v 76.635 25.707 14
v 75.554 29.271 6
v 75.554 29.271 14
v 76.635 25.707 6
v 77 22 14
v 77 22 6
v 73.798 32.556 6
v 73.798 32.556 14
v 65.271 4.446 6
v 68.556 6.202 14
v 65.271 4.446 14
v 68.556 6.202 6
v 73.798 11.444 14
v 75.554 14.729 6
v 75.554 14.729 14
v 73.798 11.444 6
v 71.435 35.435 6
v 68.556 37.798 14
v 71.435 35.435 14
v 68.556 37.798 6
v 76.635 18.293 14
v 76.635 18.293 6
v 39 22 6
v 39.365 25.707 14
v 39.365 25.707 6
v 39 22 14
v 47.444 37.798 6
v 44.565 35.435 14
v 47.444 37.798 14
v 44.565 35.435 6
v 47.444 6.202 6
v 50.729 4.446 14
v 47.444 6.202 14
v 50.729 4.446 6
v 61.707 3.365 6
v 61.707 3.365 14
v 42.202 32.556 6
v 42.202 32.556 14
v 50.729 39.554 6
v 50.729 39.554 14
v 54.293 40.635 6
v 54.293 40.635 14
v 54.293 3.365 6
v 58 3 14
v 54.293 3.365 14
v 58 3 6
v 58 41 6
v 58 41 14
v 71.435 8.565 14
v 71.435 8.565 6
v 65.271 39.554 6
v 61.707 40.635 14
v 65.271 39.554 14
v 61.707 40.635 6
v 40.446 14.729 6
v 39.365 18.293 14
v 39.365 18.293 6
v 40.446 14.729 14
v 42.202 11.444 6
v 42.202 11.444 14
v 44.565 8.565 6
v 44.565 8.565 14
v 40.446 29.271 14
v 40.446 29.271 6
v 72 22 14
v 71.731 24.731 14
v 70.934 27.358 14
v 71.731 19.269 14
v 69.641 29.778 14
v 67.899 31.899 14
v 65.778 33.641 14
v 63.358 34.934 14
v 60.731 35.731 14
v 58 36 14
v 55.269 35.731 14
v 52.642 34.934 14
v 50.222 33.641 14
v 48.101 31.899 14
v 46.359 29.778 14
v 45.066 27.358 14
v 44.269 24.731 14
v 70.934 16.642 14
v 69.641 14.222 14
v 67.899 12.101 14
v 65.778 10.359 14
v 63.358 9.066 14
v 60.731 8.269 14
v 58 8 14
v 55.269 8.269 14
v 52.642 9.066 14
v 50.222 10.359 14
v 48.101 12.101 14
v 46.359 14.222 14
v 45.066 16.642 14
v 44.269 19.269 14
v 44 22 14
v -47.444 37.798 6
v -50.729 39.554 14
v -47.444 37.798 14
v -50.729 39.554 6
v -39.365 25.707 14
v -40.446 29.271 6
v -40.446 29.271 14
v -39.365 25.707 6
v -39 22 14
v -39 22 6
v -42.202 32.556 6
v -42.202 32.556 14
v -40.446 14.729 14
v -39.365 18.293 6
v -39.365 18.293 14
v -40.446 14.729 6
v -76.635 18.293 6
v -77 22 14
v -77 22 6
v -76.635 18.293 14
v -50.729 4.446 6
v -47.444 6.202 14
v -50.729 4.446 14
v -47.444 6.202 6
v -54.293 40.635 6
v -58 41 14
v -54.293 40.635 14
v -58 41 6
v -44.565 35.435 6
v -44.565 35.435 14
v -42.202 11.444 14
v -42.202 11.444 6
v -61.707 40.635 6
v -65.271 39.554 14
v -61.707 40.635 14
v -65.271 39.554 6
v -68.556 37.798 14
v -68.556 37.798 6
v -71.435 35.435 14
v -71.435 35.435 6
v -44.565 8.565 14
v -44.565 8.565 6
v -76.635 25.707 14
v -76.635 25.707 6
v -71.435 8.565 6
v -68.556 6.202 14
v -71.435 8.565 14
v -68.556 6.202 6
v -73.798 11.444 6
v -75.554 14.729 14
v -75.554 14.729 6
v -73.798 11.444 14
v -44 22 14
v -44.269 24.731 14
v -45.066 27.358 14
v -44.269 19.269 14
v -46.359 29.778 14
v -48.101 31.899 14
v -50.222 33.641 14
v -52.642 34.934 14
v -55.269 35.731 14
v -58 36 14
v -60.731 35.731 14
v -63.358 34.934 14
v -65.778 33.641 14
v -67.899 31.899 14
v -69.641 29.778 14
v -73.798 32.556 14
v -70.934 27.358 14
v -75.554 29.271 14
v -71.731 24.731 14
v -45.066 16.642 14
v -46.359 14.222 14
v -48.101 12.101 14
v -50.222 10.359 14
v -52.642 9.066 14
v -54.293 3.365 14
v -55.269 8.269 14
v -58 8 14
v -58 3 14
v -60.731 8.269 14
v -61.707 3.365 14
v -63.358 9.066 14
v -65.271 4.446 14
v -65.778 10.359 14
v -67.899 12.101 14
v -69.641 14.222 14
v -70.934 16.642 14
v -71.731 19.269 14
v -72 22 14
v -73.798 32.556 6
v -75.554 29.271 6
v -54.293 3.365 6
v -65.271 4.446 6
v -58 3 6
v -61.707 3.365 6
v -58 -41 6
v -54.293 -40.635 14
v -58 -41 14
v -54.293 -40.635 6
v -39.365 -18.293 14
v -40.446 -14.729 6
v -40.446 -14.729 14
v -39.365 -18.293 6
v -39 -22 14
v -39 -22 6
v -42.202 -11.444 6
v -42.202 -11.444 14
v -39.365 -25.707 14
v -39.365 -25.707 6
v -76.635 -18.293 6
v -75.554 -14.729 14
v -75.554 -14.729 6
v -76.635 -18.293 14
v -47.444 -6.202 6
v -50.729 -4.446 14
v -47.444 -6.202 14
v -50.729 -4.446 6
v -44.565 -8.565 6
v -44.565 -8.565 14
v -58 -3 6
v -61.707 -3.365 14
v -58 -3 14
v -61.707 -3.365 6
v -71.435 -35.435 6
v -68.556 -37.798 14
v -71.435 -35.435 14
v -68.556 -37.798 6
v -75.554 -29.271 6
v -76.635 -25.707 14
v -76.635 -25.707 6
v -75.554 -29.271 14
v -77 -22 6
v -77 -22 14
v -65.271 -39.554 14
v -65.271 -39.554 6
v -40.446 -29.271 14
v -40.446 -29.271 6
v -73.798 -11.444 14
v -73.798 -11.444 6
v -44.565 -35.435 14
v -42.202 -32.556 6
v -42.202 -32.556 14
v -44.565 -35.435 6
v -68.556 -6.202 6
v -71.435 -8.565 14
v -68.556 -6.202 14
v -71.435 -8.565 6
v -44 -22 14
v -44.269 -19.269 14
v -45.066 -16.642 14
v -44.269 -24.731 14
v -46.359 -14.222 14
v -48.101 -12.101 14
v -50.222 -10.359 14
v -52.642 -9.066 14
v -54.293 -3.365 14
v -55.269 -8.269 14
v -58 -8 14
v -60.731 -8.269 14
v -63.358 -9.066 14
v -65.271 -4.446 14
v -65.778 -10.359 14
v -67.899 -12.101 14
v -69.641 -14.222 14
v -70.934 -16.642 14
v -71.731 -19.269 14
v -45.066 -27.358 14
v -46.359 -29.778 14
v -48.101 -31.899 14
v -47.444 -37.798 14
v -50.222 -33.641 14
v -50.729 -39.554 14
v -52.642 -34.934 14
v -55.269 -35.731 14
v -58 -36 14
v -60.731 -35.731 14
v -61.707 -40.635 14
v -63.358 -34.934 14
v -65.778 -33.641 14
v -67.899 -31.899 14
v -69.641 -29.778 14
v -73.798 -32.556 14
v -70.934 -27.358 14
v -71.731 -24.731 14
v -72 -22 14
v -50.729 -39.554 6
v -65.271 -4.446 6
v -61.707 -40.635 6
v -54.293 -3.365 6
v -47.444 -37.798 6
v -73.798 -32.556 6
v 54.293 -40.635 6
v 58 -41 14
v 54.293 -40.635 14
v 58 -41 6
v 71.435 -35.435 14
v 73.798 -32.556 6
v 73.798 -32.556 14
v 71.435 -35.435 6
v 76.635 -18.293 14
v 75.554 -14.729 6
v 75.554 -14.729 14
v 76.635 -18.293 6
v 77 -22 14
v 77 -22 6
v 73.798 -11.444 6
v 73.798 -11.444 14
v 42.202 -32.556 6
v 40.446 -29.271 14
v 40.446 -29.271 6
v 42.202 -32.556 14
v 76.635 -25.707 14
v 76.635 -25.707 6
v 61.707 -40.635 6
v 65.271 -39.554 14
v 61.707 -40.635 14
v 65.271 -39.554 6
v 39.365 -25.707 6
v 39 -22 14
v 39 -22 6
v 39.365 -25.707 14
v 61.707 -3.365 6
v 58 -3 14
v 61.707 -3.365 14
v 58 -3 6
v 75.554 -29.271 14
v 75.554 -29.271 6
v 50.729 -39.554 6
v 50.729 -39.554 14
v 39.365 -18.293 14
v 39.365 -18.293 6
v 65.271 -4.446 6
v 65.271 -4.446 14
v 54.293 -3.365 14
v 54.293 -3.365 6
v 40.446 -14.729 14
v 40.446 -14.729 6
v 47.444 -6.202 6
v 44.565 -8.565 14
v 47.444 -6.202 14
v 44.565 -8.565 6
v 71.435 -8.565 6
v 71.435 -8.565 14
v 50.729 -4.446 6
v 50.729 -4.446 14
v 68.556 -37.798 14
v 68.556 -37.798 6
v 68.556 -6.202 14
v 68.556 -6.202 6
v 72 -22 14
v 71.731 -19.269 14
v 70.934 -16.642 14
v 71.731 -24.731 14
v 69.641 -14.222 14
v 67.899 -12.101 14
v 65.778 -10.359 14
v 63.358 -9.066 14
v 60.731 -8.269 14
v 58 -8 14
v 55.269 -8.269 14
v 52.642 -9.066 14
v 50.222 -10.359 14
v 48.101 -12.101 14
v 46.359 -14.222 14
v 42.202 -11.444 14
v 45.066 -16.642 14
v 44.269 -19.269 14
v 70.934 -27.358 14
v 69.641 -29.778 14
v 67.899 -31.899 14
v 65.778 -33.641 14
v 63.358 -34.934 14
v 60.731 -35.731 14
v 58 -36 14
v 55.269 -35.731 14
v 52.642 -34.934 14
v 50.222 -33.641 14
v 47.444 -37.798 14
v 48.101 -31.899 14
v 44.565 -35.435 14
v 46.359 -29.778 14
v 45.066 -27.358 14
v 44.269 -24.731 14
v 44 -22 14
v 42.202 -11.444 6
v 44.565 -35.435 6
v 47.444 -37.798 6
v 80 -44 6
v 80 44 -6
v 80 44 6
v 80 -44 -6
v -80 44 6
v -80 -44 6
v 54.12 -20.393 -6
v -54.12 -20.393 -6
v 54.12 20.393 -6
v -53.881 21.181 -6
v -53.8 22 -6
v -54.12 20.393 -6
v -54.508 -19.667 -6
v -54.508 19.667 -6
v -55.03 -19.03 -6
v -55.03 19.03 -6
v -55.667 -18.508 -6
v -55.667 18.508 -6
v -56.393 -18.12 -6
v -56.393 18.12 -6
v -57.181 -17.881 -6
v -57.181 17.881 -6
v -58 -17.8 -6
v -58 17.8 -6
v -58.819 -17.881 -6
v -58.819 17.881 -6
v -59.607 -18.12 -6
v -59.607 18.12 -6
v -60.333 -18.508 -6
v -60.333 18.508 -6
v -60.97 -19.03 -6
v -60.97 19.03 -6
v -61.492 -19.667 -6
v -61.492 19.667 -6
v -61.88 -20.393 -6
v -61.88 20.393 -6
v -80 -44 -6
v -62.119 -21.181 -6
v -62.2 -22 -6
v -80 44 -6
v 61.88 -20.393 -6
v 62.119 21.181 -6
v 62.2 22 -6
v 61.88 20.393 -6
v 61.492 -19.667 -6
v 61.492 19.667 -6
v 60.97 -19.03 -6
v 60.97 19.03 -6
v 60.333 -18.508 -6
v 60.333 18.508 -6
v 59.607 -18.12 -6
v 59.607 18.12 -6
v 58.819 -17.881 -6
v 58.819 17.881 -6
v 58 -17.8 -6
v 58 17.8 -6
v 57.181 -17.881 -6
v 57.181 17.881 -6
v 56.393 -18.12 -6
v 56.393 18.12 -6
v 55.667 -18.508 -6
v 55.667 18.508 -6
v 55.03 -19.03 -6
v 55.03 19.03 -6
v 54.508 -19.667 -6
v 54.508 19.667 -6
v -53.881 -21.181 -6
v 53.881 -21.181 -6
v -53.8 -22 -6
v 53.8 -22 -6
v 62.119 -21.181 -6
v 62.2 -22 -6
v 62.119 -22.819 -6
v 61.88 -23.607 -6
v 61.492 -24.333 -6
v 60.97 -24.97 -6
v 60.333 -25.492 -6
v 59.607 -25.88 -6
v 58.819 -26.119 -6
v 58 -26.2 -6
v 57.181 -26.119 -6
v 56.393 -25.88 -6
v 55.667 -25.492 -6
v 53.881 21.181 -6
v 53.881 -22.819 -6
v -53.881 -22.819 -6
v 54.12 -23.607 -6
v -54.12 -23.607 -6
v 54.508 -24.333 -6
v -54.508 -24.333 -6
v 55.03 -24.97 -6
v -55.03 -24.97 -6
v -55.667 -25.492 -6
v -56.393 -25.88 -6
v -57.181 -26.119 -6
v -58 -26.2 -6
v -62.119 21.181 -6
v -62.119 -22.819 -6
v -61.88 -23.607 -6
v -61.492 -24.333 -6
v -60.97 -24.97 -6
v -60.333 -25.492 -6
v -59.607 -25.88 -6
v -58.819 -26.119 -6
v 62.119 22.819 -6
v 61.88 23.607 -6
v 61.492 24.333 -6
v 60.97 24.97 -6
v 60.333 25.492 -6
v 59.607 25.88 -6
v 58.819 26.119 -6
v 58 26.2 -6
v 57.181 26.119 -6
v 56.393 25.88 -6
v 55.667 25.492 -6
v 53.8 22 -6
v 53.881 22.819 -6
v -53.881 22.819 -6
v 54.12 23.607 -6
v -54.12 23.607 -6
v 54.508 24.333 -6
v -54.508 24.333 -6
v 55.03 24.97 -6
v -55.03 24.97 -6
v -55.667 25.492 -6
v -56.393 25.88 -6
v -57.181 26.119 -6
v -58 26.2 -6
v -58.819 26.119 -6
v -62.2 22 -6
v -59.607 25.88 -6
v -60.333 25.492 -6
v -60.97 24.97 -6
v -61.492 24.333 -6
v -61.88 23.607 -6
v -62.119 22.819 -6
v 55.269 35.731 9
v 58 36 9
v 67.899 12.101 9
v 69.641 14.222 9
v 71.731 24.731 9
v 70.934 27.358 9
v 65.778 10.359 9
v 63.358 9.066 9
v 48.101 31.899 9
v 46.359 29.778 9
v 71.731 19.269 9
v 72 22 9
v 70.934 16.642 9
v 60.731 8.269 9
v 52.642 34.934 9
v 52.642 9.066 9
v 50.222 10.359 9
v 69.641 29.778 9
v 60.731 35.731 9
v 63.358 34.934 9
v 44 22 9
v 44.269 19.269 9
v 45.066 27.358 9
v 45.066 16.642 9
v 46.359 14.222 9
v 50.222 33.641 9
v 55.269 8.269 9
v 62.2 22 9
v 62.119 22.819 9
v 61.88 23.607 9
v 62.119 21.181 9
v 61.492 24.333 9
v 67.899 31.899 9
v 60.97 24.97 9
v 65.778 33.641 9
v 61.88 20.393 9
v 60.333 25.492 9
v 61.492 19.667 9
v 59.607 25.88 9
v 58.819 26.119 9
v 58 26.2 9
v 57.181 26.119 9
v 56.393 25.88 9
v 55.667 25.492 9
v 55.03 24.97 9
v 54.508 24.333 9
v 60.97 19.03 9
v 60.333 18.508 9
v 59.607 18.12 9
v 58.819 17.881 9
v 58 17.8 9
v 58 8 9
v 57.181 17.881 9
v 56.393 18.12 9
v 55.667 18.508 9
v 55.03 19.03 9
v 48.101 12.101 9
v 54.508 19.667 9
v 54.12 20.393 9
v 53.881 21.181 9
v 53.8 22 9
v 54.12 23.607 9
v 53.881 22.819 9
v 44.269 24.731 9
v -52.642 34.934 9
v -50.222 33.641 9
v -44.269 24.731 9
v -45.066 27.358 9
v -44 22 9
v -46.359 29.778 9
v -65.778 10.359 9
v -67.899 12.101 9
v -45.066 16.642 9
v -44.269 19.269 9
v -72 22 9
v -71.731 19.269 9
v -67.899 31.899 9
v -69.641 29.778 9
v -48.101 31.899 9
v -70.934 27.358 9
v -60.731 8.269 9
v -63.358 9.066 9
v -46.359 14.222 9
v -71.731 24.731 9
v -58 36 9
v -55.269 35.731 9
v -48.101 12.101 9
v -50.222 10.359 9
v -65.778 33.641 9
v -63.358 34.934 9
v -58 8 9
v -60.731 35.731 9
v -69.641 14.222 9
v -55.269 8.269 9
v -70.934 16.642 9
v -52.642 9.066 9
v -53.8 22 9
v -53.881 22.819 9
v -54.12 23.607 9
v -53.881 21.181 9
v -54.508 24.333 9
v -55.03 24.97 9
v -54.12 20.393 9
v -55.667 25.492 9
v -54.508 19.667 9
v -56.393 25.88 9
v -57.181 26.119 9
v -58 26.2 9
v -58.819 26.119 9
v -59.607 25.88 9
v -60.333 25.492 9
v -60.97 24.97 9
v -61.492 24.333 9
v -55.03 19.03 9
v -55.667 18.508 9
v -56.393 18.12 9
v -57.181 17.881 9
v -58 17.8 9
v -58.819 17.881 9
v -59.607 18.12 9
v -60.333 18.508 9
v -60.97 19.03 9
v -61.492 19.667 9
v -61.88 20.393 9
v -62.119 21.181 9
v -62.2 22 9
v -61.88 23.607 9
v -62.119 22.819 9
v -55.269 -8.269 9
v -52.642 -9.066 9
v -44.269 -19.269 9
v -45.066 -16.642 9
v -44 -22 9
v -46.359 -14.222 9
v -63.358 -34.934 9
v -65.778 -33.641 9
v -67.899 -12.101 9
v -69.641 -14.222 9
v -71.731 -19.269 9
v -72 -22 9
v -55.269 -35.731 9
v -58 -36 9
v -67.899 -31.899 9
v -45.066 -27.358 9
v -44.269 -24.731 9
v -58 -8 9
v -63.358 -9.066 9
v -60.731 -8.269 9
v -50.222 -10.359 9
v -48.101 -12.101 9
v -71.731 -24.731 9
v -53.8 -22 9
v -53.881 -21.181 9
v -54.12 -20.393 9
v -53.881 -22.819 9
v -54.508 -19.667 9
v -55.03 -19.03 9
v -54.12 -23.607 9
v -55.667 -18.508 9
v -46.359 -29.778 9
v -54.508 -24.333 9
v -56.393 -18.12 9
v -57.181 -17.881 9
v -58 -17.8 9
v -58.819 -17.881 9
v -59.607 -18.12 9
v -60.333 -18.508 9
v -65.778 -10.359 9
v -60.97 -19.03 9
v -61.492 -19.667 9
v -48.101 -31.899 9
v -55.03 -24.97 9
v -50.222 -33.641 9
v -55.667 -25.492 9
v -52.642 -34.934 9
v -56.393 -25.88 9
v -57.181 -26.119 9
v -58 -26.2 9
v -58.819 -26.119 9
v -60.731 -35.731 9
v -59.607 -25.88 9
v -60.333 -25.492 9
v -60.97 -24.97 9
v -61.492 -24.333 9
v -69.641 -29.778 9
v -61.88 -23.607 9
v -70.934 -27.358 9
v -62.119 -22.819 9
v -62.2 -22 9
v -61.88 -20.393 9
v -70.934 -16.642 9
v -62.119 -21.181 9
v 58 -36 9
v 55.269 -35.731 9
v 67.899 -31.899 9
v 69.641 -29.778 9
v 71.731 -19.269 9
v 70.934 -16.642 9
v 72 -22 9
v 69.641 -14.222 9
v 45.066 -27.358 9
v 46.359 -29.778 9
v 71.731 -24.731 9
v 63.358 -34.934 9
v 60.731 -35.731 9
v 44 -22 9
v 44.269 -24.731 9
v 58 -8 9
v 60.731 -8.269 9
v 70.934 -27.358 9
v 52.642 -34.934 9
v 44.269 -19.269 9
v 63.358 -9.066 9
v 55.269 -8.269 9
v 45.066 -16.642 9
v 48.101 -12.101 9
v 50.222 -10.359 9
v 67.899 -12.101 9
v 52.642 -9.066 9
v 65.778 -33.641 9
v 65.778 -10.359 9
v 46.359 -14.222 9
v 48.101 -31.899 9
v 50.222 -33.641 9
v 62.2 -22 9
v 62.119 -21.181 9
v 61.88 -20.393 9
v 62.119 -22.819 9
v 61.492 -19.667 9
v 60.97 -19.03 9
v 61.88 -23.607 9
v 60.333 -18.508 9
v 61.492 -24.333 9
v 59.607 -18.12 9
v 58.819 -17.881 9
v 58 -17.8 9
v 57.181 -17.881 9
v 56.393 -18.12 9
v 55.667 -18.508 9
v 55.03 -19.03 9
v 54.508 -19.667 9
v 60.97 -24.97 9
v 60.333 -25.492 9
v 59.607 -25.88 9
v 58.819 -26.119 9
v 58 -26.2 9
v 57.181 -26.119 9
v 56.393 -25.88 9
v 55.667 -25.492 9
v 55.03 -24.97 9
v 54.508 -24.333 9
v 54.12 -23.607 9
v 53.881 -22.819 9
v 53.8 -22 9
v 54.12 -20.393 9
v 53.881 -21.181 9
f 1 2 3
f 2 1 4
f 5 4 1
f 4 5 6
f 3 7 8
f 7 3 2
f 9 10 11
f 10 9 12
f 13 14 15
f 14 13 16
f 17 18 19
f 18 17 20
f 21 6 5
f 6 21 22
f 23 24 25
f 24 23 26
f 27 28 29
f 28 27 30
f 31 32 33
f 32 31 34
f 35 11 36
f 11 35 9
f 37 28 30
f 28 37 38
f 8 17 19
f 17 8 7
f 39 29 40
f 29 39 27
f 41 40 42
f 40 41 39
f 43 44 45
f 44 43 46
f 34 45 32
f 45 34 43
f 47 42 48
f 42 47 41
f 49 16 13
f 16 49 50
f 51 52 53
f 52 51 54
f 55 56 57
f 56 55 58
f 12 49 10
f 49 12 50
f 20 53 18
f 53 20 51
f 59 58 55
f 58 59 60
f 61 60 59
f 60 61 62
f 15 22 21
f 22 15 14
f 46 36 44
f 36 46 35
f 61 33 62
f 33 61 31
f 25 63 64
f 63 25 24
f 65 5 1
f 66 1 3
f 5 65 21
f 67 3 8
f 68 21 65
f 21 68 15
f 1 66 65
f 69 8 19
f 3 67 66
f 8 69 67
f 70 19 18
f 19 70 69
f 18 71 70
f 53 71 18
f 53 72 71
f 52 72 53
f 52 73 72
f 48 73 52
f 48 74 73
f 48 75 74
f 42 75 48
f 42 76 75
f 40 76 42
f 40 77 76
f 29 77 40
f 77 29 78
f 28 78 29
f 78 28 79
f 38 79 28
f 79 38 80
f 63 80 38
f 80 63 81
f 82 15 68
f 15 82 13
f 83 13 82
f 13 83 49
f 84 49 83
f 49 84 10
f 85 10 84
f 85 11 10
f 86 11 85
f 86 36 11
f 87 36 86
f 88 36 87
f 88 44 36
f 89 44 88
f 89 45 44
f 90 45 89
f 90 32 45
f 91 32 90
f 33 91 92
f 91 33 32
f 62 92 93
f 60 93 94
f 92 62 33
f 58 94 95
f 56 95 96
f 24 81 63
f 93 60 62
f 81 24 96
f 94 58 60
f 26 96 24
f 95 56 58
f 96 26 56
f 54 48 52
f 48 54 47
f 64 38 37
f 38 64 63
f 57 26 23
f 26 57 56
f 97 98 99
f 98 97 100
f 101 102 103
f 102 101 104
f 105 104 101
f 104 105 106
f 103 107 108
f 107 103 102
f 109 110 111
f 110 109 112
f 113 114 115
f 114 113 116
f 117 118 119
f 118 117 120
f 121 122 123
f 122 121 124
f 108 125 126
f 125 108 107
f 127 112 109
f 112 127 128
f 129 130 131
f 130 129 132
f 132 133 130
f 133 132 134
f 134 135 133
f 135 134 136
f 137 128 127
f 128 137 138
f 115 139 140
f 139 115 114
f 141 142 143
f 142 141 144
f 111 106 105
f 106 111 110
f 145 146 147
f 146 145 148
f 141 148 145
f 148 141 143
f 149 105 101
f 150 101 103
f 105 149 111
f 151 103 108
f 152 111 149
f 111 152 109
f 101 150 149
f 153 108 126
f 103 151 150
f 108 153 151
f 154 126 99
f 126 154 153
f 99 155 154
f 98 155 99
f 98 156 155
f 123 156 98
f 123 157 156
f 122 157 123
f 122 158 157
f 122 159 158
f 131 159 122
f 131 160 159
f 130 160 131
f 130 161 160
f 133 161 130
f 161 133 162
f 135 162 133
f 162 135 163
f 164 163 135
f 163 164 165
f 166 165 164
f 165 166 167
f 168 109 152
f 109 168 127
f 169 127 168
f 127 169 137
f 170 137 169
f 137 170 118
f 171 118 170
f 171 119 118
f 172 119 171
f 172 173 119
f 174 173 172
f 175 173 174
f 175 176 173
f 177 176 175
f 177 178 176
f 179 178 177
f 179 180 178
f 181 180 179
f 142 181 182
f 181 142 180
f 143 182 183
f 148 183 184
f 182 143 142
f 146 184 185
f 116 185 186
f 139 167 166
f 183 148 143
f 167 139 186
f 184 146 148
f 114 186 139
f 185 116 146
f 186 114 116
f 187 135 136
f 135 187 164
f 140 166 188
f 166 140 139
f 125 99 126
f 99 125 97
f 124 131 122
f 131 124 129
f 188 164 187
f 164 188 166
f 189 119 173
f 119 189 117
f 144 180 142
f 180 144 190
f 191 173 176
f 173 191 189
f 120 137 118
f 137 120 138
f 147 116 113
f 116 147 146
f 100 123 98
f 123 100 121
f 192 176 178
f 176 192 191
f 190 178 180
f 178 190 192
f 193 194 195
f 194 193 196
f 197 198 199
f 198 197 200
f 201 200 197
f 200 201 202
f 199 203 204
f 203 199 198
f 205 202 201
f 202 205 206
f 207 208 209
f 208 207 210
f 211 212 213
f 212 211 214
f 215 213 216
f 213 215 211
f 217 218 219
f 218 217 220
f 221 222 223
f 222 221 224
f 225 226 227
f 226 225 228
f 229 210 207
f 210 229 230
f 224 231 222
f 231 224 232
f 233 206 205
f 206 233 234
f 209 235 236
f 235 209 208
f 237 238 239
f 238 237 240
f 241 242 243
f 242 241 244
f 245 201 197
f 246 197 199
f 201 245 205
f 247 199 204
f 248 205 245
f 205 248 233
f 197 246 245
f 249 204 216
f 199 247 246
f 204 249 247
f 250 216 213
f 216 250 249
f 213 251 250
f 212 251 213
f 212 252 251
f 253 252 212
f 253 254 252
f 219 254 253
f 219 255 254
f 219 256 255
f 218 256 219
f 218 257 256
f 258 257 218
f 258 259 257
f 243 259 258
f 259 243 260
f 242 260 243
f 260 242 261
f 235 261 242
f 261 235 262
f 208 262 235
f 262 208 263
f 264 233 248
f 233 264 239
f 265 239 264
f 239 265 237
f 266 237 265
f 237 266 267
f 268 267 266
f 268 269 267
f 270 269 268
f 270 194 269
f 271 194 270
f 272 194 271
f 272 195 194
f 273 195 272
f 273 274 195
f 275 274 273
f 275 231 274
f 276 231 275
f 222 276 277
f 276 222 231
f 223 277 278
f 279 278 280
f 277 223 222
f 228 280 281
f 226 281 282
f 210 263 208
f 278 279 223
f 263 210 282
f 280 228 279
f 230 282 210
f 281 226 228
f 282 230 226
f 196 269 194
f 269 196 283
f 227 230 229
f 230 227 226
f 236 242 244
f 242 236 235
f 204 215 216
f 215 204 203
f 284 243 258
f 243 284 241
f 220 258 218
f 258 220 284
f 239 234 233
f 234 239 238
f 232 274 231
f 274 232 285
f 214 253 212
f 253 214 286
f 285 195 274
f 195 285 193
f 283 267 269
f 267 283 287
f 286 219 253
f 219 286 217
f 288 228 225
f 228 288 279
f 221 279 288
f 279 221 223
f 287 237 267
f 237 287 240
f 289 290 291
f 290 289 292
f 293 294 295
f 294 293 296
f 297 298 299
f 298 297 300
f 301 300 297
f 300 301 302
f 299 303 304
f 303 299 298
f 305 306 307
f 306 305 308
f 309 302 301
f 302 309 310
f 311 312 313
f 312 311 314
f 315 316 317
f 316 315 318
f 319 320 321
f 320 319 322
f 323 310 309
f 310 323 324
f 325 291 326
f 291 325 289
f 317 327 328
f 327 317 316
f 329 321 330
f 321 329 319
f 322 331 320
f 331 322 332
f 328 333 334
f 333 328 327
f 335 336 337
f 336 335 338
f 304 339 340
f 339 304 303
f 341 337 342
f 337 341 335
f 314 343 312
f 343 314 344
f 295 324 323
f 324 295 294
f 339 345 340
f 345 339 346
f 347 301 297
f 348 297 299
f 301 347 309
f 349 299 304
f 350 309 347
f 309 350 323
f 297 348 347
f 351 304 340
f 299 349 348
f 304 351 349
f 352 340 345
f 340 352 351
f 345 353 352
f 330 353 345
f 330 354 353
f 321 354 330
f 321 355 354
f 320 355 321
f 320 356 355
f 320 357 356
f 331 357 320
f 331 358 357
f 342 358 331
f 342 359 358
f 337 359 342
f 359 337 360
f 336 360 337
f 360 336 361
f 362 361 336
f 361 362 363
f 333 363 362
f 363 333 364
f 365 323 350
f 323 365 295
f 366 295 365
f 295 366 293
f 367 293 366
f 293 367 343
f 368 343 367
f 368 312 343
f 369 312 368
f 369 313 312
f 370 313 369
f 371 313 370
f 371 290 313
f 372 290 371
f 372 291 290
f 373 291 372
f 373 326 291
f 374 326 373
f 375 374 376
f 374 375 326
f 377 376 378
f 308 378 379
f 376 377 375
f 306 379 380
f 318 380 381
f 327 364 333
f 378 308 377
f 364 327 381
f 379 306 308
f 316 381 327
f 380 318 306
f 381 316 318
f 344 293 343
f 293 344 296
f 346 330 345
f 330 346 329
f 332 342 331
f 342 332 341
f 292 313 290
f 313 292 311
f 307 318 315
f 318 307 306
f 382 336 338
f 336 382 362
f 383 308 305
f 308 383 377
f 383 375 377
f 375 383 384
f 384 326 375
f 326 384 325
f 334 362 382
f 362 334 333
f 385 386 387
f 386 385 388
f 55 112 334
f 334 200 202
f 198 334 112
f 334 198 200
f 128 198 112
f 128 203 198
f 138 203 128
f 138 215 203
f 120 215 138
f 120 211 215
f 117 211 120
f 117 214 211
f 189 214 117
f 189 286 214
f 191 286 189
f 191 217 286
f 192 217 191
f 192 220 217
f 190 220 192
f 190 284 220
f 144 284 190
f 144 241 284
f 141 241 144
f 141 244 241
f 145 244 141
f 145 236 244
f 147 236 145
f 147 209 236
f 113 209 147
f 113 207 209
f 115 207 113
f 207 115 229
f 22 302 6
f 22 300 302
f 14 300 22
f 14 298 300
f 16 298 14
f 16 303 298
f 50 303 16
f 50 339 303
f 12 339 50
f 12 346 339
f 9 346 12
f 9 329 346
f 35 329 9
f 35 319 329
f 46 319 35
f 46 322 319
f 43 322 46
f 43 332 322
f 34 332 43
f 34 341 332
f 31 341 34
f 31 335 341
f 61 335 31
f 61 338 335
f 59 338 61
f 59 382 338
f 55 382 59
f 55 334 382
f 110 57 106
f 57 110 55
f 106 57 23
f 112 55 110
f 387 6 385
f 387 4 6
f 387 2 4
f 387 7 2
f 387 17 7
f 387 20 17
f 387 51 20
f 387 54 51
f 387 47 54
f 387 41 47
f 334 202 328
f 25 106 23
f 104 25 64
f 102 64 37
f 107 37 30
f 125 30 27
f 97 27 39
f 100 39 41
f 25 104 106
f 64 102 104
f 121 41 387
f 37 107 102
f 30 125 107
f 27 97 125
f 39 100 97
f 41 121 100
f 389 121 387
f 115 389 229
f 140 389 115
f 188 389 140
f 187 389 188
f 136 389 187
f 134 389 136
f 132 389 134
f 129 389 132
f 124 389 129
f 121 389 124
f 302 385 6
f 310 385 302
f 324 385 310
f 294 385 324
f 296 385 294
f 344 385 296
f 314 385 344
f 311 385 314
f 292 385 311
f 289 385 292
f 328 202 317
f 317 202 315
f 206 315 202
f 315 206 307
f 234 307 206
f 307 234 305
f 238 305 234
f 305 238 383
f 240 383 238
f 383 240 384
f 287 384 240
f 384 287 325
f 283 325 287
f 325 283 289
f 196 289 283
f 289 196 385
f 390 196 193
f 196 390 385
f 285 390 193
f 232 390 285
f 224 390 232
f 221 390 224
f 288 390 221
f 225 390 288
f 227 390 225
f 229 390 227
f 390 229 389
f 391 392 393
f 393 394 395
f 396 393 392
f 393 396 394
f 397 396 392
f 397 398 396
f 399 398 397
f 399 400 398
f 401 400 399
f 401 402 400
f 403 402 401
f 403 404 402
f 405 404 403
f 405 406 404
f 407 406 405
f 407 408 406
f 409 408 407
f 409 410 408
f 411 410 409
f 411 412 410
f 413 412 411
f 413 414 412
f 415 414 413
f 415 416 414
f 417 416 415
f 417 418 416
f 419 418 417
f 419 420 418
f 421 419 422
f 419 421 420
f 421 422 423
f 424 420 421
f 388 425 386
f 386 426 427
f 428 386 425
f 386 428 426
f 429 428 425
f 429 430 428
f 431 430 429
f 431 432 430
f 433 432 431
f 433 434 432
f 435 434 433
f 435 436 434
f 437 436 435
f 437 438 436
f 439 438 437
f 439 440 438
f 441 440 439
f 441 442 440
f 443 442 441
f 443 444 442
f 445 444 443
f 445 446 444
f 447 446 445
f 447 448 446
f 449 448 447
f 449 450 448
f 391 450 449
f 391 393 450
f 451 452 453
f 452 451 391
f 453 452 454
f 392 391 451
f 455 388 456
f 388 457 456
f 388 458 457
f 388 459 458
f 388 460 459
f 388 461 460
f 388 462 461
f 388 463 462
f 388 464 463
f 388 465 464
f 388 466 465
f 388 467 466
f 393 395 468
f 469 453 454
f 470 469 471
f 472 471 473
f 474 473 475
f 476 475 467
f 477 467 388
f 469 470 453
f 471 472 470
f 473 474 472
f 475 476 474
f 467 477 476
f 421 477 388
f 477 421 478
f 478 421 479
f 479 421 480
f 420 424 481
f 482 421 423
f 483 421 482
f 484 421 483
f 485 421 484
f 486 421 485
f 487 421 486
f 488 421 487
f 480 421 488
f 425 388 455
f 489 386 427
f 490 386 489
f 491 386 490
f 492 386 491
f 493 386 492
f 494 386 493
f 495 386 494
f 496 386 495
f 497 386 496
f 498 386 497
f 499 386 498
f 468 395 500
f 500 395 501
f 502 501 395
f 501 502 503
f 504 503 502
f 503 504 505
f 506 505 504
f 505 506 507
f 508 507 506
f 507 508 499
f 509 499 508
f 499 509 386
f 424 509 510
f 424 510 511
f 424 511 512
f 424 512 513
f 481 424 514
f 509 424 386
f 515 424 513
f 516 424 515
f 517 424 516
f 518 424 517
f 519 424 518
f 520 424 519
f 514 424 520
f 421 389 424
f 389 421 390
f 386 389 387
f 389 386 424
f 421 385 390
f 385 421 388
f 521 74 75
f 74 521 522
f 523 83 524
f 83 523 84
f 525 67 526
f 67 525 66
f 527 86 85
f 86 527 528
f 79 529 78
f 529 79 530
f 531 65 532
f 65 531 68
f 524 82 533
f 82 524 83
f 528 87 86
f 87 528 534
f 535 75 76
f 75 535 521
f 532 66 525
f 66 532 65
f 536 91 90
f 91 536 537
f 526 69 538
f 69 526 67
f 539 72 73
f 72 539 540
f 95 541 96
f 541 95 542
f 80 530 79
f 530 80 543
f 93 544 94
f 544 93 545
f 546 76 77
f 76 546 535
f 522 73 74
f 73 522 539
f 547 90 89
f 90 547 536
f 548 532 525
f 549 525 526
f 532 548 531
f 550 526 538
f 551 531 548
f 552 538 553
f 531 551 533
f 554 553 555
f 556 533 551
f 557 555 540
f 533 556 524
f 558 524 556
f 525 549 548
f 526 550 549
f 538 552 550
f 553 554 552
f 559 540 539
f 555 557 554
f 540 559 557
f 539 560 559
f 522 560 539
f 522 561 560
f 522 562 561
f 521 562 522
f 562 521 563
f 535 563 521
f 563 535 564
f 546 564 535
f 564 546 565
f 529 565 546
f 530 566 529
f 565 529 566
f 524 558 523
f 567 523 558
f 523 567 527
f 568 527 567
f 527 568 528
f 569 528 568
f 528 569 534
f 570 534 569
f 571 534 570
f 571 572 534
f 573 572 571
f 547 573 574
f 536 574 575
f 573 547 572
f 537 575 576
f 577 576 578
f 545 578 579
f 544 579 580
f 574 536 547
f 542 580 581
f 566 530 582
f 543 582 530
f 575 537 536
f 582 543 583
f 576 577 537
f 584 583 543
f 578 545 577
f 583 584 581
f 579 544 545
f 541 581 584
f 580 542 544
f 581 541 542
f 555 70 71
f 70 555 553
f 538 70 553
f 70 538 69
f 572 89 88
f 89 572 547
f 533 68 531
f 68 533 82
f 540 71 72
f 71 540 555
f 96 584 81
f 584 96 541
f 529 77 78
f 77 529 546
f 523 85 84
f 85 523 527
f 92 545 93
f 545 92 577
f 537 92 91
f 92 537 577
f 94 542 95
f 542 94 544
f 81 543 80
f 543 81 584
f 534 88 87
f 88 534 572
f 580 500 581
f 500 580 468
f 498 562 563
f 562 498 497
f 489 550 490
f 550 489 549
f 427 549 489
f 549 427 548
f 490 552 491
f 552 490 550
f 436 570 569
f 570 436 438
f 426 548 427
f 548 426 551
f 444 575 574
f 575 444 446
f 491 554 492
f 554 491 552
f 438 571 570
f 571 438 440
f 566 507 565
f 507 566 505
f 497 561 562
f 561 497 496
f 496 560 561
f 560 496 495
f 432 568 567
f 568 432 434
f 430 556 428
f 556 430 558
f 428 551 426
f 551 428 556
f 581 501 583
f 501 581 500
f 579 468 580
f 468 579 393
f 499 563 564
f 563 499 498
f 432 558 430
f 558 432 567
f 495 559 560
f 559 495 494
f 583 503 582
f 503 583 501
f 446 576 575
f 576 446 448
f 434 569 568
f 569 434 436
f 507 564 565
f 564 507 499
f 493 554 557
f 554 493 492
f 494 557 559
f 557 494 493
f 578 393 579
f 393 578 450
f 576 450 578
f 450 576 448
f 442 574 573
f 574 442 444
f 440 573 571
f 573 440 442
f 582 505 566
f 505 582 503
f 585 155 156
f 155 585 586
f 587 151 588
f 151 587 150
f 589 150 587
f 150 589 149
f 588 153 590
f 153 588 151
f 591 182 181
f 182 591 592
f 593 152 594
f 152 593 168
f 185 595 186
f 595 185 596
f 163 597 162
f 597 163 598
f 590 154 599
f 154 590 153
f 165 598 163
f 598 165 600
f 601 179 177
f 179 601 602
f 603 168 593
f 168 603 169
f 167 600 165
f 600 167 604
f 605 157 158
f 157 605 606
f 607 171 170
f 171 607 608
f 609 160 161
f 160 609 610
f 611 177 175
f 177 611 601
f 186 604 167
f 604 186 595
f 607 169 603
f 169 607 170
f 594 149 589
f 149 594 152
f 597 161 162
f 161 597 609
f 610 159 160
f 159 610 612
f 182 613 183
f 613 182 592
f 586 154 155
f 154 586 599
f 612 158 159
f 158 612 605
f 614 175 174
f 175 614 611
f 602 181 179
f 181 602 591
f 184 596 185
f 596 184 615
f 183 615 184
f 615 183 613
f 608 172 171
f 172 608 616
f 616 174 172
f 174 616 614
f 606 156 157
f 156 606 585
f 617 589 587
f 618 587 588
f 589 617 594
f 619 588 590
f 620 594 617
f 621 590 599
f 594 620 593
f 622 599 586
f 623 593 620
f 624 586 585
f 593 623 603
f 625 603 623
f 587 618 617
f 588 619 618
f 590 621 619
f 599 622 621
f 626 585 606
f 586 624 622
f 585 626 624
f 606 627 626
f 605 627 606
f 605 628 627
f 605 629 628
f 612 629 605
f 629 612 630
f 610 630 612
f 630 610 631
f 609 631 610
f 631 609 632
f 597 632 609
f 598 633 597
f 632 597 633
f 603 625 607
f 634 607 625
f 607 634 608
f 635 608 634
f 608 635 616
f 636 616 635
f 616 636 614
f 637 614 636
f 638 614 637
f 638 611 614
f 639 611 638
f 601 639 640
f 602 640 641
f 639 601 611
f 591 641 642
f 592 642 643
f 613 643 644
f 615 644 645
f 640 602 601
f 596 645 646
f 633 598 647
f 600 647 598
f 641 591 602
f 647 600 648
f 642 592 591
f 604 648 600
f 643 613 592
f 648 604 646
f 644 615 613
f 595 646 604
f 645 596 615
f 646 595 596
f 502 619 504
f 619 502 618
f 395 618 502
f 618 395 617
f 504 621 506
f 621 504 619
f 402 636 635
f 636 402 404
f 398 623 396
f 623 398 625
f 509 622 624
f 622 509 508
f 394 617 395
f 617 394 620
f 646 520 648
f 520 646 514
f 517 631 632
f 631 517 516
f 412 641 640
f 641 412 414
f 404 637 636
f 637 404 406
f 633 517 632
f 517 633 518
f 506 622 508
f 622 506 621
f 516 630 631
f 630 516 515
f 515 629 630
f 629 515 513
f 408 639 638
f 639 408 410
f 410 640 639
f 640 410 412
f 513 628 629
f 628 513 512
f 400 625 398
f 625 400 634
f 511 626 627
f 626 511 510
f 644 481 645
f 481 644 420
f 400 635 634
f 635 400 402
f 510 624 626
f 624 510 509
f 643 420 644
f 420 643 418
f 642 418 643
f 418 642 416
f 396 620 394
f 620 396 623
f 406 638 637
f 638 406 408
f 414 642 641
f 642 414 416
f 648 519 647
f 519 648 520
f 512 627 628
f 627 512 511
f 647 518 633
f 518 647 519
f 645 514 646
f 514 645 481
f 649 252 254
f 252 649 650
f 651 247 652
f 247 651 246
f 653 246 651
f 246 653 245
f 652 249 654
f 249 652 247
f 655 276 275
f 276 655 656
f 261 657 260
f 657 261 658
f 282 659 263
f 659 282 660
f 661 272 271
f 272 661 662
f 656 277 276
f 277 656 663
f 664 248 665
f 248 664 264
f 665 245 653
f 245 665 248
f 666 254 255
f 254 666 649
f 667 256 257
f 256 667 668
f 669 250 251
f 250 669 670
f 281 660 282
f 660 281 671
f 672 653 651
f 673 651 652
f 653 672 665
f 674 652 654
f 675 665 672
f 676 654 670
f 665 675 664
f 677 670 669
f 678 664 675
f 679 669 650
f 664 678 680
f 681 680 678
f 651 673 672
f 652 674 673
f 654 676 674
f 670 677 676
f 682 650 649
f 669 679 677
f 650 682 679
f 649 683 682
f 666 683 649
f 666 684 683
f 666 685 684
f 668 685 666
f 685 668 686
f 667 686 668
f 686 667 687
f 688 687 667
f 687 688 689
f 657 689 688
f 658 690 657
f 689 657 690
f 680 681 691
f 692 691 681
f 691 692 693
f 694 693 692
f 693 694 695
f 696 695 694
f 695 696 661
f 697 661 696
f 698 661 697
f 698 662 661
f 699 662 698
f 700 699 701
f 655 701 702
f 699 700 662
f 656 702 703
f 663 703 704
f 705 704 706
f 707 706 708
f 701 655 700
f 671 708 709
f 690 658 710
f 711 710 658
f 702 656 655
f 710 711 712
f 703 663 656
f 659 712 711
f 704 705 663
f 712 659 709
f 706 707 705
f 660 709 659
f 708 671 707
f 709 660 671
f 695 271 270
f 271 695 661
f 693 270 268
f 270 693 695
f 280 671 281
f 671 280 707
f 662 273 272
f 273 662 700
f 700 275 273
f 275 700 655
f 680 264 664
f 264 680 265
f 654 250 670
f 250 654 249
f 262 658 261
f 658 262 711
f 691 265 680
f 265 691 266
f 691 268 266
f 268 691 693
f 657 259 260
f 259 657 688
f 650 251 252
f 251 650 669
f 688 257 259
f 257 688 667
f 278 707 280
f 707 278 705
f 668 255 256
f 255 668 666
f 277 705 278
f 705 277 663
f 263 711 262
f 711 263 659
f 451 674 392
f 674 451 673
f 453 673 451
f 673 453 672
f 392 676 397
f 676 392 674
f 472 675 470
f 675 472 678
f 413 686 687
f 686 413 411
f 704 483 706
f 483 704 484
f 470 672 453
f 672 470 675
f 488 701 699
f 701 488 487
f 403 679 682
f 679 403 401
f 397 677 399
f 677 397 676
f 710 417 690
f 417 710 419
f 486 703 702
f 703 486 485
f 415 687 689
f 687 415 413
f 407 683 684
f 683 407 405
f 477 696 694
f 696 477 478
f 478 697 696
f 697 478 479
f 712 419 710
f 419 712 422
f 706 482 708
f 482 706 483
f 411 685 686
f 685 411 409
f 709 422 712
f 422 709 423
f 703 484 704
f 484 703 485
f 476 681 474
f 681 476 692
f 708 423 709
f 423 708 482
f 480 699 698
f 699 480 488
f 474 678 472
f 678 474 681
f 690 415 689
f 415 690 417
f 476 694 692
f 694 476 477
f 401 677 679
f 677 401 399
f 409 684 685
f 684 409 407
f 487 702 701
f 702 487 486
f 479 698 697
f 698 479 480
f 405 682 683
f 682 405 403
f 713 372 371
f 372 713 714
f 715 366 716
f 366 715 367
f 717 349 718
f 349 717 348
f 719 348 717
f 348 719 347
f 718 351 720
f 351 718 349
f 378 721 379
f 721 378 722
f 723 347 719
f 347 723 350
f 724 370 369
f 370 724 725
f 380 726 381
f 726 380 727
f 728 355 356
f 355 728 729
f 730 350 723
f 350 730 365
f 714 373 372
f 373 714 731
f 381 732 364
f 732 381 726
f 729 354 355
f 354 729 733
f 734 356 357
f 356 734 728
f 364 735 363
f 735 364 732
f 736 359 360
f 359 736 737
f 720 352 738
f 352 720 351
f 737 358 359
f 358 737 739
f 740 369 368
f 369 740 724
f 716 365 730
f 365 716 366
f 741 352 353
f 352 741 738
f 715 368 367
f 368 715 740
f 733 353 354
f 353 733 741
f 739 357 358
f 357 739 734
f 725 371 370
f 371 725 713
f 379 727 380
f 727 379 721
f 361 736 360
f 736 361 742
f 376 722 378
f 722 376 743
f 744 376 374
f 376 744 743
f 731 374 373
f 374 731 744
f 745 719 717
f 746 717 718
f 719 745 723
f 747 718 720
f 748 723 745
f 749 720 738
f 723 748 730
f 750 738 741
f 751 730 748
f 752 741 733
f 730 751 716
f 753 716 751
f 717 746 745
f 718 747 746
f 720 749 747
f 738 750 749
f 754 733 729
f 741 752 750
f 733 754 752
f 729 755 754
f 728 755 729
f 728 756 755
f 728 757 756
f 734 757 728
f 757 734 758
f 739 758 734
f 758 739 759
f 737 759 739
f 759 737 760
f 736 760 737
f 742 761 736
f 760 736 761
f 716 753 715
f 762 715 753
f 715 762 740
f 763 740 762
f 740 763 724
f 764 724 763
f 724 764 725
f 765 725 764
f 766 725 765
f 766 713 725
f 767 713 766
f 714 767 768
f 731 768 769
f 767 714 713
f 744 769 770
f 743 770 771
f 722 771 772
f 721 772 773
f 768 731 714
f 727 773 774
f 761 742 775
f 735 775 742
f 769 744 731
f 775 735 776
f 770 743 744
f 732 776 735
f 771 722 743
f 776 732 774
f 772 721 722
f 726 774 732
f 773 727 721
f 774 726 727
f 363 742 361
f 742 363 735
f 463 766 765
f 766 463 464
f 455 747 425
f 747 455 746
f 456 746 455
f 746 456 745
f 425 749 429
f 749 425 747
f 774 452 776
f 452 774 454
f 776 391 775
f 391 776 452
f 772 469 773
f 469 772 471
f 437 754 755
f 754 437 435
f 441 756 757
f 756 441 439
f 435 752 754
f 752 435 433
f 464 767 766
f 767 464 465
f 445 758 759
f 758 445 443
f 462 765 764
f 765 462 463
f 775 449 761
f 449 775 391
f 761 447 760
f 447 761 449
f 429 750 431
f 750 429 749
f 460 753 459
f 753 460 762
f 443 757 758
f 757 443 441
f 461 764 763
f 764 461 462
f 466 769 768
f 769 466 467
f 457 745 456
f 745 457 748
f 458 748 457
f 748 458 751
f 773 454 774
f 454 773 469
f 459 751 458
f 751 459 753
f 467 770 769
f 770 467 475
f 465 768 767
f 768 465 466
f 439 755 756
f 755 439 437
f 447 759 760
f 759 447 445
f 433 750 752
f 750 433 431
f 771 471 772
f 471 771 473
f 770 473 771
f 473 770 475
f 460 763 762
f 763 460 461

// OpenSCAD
$fn = 32;

// ----------------------------------------------------------------------
// Socket pad plate
// bosses with counterbored sockets for the screws
// ----------------------------------------------------------------------

// --- parameters (mm) ---
base_t = 12;            // base plate thickness
boss_h = 8;             // boss height above the base plate
boss_d = 38;            // boss diameter
socket_d = 28;          // socket diameter
socket_depth = 5;       // socket depth from the boss face
bolt_d = 8.4;           // screw clearance hole through the socket floor
plate = [160, 88, 12];  // overall size (x, y, z)
edge = 22;              // boss centre offset from the plate edge
pads = 4;               // boss count, one per corner

// --- derived feature positions (mm) ---
height = base_t + boss_h;        // = 20   overall height of the part
corner_x = plate[0] / 2 - edge;  // = 58   boss centre X
corner_y = plate[1] / 2 - edge;  // = 22   boss centre Y
feature_centers = [
  [corner_x, corner_y],
  [-corner_x, corner_y],
  [-corner_x, -corner_y],
  [corner_x, -corner_y]
];   // boss centres: sockets, holes and the pads themselves are placed from here

// base plate, bosses on feature_centers, socket + through hole in each
difference() {
  union() {
    cube(plate, center = true);
    for (centre = feature_centers)
      translate([centre[0], centre[1], plate[2] / 2 - 1])
        cylinder(d = boss_d, h = boss_h + 1);
  }
  for (centre = feature_centers) {
    translate([centre[0], centre[1], plate[2] / 2 + boss_h - socket_depth])
      cylinder(d = socket_d, h = socket_depth + 1);
    translate([centre[0], centre[1], -height])
      cylinder(d = bolt_d, h = 2 * height + 2);  // through the socket floor
  }
}
